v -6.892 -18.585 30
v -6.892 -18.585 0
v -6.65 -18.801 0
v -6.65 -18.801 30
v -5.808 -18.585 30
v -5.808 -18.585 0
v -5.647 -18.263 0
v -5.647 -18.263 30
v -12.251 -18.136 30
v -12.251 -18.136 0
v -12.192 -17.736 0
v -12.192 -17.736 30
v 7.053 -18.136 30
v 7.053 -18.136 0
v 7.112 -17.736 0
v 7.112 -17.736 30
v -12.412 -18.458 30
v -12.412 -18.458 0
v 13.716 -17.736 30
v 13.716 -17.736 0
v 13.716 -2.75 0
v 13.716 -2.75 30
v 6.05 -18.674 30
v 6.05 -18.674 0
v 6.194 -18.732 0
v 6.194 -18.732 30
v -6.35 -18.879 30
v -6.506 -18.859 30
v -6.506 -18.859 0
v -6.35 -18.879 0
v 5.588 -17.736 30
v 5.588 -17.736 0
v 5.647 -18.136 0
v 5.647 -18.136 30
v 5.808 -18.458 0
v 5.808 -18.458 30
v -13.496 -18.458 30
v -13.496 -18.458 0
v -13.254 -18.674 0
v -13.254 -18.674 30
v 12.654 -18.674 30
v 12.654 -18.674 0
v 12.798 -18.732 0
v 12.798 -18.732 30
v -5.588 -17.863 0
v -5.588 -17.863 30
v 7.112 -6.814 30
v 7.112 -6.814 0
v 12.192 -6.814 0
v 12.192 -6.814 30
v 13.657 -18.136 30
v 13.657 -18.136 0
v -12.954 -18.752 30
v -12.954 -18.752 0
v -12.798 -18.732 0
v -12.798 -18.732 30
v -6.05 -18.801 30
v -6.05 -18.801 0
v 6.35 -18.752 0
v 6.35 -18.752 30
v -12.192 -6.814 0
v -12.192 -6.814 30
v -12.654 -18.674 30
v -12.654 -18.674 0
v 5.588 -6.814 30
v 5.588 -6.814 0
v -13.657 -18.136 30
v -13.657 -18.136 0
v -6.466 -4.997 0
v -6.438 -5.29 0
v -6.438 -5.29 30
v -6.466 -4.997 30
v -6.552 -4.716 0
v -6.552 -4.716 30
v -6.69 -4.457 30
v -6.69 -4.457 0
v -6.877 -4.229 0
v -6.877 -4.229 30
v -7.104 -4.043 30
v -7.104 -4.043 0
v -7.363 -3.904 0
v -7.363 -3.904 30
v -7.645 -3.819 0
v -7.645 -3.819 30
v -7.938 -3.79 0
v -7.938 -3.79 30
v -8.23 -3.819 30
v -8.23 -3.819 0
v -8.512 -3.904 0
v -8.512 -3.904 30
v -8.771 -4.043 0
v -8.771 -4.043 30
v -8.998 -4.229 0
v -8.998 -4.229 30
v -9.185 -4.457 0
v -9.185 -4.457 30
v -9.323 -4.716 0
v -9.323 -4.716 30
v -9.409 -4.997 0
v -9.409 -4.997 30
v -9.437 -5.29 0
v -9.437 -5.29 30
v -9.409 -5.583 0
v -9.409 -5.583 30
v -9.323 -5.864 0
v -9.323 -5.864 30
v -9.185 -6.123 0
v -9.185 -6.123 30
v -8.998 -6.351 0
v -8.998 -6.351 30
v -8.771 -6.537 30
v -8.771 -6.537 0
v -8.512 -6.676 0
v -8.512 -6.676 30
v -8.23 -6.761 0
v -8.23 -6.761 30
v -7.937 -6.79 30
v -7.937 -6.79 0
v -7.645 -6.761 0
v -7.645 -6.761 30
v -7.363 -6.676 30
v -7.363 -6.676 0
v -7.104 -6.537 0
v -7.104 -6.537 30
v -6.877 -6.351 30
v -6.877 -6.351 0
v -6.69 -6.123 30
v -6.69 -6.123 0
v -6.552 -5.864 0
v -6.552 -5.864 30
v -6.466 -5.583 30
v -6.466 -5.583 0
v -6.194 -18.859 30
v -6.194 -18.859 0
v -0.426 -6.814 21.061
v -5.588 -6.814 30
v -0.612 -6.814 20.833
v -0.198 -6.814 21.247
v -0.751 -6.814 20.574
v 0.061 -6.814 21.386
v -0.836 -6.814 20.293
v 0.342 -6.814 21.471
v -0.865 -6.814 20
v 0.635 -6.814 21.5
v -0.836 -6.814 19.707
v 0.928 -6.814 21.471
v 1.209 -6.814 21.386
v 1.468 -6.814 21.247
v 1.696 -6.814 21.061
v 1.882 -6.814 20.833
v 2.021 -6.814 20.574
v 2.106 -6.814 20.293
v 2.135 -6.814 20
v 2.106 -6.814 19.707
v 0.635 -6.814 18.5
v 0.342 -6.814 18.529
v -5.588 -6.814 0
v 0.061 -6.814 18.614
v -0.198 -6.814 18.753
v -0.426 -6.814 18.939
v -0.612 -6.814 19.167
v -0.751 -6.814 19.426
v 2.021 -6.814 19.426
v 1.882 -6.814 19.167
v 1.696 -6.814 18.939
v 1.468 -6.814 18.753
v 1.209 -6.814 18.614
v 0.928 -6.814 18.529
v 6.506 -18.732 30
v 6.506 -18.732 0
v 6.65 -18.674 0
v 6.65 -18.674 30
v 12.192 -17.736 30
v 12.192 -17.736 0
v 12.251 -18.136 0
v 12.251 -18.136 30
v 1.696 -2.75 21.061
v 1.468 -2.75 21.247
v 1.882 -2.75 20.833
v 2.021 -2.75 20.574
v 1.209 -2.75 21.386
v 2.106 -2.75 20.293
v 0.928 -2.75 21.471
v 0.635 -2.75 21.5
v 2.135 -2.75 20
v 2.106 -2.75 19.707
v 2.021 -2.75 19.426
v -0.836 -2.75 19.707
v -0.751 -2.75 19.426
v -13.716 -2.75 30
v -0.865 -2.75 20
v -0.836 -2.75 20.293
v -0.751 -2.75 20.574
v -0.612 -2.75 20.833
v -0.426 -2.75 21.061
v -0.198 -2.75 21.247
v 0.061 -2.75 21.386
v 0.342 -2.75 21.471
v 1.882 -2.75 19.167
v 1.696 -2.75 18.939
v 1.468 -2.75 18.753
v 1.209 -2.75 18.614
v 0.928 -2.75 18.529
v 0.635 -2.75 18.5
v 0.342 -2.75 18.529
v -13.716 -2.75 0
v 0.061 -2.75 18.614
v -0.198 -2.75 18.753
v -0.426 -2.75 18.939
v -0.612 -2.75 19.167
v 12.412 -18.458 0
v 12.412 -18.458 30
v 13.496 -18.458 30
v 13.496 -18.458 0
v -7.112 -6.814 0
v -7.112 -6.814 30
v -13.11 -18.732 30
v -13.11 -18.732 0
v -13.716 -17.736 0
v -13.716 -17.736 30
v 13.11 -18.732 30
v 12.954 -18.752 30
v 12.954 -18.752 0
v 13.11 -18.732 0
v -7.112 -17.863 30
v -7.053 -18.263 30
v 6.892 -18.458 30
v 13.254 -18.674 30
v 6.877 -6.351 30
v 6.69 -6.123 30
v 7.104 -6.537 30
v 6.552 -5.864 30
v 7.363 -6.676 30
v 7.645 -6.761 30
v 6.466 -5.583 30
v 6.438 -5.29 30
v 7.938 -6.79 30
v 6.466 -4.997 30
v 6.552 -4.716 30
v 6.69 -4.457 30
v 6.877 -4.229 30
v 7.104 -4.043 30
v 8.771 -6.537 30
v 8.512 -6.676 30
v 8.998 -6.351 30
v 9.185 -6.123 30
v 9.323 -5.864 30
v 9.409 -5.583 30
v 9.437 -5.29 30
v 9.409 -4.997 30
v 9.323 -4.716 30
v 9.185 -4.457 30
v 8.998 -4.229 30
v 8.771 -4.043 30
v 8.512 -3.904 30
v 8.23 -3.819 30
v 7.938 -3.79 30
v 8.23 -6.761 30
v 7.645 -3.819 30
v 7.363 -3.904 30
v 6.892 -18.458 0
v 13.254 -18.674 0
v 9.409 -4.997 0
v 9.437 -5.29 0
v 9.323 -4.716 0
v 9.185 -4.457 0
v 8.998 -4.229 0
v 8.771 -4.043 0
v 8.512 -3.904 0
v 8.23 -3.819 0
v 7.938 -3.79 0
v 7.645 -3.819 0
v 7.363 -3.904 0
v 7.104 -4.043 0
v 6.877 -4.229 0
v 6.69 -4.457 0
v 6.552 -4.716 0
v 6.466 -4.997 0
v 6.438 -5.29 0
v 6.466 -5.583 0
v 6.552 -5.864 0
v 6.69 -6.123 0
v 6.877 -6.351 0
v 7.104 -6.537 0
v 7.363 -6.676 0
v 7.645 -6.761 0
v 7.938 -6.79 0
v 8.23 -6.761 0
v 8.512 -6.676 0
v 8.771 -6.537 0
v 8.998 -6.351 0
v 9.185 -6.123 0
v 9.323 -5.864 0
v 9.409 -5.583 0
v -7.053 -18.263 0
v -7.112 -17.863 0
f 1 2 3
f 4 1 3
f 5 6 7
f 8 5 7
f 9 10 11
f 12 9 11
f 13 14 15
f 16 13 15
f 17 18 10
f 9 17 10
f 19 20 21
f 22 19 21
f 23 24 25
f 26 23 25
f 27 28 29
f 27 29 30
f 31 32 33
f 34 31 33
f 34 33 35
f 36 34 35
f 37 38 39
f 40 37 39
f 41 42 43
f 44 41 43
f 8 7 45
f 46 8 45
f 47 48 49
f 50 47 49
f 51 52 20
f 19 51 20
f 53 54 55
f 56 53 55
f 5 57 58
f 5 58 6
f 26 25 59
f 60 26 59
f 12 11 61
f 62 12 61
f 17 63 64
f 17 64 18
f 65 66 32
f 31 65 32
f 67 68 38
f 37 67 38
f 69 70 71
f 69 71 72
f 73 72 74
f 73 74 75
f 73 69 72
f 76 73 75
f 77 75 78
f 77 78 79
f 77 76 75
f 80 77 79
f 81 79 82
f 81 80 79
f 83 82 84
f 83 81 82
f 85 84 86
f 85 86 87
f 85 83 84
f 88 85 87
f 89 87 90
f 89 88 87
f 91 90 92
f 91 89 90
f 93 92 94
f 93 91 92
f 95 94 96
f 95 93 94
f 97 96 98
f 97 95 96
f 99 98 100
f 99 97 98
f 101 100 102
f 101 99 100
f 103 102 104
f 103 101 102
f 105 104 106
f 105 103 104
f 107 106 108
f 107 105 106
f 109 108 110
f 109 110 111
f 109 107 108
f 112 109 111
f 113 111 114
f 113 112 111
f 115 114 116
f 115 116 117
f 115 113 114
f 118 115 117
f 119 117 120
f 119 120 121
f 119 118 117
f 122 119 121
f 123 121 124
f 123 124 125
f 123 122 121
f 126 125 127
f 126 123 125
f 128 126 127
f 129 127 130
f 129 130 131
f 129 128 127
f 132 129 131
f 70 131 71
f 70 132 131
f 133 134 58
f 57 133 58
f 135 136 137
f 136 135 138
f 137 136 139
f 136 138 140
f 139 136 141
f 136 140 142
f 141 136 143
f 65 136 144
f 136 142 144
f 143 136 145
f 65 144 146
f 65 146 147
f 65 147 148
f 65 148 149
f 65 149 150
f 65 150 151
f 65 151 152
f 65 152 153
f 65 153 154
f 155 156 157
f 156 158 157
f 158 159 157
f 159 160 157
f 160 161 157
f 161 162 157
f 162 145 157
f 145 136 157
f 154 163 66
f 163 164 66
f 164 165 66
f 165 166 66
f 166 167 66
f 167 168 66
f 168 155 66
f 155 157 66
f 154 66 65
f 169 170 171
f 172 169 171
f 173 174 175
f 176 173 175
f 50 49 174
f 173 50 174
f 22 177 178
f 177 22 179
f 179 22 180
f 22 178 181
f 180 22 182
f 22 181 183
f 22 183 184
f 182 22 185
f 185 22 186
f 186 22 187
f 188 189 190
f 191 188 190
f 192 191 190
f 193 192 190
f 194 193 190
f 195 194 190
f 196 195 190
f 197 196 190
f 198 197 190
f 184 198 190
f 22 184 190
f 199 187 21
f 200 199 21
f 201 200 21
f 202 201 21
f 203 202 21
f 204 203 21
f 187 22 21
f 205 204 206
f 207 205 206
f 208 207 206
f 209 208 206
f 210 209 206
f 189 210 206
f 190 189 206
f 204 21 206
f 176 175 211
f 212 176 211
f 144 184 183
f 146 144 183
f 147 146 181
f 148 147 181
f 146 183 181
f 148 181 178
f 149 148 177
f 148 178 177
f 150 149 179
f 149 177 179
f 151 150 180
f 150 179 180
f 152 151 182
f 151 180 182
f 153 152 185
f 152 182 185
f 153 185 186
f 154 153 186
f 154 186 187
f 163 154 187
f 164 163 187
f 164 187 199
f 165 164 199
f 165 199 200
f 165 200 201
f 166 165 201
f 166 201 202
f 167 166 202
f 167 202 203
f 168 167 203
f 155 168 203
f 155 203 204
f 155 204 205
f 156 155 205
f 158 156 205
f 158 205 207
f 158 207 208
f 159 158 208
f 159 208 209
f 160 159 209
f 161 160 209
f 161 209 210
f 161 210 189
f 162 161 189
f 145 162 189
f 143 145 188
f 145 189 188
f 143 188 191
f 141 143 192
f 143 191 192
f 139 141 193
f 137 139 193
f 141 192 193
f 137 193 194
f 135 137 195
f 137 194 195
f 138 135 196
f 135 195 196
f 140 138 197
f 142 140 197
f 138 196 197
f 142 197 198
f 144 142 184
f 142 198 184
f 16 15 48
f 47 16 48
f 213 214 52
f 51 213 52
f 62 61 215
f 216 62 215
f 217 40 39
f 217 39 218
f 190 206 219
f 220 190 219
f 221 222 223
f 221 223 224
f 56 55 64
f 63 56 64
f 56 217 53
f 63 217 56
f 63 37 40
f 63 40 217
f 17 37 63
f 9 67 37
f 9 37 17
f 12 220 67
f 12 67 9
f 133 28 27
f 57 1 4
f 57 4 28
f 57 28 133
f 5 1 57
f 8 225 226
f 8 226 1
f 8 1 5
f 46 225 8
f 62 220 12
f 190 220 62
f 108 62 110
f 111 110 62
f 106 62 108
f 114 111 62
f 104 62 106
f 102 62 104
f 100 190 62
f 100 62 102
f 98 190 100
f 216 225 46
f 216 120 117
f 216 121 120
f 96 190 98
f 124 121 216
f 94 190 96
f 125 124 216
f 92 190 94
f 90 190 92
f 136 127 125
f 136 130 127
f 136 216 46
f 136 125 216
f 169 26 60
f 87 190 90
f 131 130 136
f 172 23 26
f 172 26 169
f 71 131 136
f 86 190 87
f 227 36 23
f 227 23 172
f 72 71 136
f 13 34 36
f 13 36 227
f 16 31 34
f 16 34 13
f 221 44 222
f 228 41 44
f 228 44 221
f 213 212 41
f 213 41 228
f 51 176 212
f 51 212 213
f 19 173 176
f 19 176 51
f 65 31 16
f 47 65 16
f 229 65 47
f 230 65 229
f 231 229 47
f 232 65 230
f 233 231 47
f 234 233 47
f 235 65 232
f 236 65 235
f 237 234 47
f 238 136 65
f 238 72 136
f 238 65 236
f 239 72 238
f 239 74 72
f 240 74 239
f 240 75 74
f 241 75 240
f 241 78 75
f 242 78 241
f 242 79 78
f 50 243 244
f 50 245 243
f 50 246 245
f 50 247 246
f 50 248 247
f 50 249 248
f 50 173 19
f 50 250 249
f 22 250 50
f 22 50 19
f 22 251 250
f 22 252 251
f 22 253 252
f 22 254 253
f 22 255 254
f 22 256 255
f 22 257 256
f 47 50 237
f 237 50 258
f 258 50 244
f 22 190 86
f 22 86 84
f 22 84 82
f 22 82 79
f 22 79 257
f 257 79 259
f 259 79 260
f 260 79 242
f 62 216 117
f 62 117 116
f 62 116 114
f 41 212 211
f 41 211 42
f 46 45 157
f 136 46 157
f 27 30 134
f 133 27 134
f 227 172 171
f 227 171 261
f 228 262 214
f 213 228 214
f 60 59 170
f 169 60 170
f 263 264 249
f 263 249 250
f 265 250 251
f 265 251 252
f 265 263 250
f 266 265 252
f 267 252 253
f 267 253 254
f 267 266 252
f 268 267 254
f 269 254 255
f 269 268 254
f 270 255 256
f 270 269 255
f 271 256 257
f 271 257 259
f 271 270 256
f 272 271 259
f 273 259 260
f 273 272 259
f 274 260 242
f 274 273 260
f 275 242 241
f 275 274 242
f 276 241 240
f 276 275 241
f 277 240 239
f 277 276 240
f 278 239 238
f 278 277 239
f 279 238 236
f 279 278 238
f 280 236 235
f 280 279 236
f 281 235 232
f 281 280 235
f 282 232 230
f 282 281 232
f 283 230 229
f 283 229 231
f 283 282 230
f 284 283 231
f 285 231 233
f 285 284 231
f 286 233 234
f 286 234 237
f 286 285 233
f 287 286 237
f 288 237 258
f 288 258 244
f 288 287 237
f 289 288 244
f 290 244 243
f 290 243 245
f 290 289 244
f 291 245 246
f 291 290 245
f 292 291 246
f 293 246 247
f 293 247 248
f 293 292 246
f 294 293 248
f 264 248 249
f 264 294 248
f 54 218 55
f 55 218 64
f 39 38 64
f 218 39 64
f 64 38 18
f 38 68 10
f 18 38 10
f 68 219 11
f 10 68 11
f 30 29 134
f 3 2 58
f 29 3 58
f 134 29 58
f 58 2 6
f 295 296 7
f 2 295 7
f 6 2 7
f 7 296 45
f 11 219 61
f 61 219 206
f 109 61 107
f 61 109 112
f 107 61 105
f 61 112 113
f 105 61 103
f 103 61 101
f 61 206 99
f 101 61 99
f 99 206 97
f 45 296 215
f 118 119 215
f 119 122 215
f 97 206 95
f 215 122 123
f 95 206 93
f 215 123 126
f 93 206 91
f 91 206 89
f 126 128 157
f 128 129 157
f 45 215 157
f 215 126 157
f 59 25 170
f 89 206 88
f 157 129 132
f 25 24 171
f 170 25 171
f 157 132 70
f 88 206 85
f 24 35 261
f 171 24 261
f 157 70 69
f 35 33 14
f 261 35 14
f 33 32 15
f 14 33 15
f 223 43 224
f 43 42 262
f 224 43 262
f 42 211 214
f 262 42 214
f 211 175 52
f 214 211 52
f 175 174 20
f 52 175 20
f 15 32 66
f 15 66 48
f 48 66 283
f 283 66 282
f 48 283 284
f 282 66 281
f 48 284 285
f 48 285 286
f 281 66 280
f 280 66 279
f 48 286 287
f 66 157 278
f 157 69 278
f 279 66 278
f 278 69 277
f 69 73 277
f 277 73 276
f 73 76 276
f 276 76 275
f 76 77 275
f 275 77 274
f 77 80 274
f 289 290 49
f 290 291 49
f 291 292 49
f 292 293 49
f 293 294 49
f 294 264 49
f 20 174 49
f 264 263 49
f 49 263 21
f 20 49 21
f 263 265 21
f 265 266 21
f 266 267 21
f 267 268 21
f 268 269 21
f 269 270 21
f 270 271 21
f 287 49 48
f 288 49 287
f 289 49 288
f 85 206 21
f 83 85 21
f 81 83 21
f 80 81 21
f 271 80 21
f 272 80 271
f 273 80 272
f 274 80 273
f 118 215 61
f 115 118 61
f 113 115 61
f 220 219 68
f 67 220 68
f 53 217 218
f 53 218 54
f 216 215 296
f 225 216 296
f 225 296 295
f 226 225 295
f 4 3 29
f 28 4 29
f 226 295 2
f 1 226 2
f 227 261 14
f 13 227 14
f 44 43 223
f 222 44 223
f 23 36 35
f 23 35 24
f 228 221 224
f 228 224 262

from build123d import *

# Parameters (mm, degrees)
RESSALTO_EXTRUS_O1_OUTLINE_R = 1.499997
RESSALTO_EXTRUS_O1_DEPTH     = 30
ESBO_O2_R                    = 1.5
CORTE_EXTRUS_O1_DEPTH        = 30


# Read off the part's stored shape, not the designer's step: Ressalto-extrusão1
with BuildPart() as part:
    # Ressalto-extrusão1 outline → Ressalto-extrusão1 (new body)
    with BuildSketch(Plane.XY):
        Polygon((-5.588, -17.863), (-5.588, -6.814), (5.588, -6.814), (5.588, -17.736), (5.646801, -18.1358468), (5.8082688, -18.4582998), (6.0501022, -18.6736156), (6.1941964, -18.7317816), (6.35, -18.752), (6.5058036, -18.7317816), (6.6498978, -18.6736156), (6.8917312, -18.4582998), (7.053199, -18.1358468), (7.112, -17.736), (7.112, -6.814), (12.192, -6.814), (12.192, -17.736), (12.250801, -18.1358468), (12.4122688, -18.4582998), (12.6541022, -18.6736156), (12.7981964, -18.7317816), (12.954, -18.752), (13.1098036, -18.7317816), (13.2538978, -18.6736156), (13.4957312, -18.4582998), (13.657199, -18.1358468), (13.716, -17.736), (13.716, -2.75), (-13.716, -2.75), (-13.716, -17.736), (-13.657199, -18.1358468), (-13.4957312, -18.4582998), (-13.2538978, -18.6736156), (-13.1098036, -18.7317816), (-12.954, -18.752), (-12.7981964, -18.7317816), (-12.6541022, -18.6736156), (-12.4122688, -18.4582998), (-12.250801, -18.1358468), (-12.192, -17.736), (-12.192, -6.814), (-7.112, -6.814), (-7.112, -17.863), (-7.053199, -18.2628468), (-6.8917312, -18.5852998), (-6.6498978, -18.8006156), (-6.5058036, -18.8587816), (-6.35, -18.879), (-6.1941964, -18.8587816), (-6.0501022, -18.8006156), (-5.8082688, -18.5852998), (-5.646801, -18.2628468), align=None)
        with Locations((-7.9375, -5.29)):
            Circle(RESSALTO_EXTRUS_O1_OUTLINE_R, mode=Mode.SUBTRACT)
        with Locations((7.9375, -5.29)):
            Circle(RESSALTO_EXTRUS_O1_OUTLINE_R, mode=Mode.SUBTRACT)
    extrude(amount=RESSALTO_EXTRUS_O1_DEPTH)

    # Esboço2 → Corte-extrusão1 (cut)
    with BuildSketch(Plane(origin=(0, -2.75, 0), x_dir=(1, 0, 0), z_dir=(0, 1, 0))):
        with Locations(Location((0.635, -20, 0), (0, 0, 270))):
            Circle(ESBO_O2_R)
    extrude(amount=-CORTE_EXTRUS_O1_DEPTH, mode=Mode.SUBTRACT)


solid = part.part
